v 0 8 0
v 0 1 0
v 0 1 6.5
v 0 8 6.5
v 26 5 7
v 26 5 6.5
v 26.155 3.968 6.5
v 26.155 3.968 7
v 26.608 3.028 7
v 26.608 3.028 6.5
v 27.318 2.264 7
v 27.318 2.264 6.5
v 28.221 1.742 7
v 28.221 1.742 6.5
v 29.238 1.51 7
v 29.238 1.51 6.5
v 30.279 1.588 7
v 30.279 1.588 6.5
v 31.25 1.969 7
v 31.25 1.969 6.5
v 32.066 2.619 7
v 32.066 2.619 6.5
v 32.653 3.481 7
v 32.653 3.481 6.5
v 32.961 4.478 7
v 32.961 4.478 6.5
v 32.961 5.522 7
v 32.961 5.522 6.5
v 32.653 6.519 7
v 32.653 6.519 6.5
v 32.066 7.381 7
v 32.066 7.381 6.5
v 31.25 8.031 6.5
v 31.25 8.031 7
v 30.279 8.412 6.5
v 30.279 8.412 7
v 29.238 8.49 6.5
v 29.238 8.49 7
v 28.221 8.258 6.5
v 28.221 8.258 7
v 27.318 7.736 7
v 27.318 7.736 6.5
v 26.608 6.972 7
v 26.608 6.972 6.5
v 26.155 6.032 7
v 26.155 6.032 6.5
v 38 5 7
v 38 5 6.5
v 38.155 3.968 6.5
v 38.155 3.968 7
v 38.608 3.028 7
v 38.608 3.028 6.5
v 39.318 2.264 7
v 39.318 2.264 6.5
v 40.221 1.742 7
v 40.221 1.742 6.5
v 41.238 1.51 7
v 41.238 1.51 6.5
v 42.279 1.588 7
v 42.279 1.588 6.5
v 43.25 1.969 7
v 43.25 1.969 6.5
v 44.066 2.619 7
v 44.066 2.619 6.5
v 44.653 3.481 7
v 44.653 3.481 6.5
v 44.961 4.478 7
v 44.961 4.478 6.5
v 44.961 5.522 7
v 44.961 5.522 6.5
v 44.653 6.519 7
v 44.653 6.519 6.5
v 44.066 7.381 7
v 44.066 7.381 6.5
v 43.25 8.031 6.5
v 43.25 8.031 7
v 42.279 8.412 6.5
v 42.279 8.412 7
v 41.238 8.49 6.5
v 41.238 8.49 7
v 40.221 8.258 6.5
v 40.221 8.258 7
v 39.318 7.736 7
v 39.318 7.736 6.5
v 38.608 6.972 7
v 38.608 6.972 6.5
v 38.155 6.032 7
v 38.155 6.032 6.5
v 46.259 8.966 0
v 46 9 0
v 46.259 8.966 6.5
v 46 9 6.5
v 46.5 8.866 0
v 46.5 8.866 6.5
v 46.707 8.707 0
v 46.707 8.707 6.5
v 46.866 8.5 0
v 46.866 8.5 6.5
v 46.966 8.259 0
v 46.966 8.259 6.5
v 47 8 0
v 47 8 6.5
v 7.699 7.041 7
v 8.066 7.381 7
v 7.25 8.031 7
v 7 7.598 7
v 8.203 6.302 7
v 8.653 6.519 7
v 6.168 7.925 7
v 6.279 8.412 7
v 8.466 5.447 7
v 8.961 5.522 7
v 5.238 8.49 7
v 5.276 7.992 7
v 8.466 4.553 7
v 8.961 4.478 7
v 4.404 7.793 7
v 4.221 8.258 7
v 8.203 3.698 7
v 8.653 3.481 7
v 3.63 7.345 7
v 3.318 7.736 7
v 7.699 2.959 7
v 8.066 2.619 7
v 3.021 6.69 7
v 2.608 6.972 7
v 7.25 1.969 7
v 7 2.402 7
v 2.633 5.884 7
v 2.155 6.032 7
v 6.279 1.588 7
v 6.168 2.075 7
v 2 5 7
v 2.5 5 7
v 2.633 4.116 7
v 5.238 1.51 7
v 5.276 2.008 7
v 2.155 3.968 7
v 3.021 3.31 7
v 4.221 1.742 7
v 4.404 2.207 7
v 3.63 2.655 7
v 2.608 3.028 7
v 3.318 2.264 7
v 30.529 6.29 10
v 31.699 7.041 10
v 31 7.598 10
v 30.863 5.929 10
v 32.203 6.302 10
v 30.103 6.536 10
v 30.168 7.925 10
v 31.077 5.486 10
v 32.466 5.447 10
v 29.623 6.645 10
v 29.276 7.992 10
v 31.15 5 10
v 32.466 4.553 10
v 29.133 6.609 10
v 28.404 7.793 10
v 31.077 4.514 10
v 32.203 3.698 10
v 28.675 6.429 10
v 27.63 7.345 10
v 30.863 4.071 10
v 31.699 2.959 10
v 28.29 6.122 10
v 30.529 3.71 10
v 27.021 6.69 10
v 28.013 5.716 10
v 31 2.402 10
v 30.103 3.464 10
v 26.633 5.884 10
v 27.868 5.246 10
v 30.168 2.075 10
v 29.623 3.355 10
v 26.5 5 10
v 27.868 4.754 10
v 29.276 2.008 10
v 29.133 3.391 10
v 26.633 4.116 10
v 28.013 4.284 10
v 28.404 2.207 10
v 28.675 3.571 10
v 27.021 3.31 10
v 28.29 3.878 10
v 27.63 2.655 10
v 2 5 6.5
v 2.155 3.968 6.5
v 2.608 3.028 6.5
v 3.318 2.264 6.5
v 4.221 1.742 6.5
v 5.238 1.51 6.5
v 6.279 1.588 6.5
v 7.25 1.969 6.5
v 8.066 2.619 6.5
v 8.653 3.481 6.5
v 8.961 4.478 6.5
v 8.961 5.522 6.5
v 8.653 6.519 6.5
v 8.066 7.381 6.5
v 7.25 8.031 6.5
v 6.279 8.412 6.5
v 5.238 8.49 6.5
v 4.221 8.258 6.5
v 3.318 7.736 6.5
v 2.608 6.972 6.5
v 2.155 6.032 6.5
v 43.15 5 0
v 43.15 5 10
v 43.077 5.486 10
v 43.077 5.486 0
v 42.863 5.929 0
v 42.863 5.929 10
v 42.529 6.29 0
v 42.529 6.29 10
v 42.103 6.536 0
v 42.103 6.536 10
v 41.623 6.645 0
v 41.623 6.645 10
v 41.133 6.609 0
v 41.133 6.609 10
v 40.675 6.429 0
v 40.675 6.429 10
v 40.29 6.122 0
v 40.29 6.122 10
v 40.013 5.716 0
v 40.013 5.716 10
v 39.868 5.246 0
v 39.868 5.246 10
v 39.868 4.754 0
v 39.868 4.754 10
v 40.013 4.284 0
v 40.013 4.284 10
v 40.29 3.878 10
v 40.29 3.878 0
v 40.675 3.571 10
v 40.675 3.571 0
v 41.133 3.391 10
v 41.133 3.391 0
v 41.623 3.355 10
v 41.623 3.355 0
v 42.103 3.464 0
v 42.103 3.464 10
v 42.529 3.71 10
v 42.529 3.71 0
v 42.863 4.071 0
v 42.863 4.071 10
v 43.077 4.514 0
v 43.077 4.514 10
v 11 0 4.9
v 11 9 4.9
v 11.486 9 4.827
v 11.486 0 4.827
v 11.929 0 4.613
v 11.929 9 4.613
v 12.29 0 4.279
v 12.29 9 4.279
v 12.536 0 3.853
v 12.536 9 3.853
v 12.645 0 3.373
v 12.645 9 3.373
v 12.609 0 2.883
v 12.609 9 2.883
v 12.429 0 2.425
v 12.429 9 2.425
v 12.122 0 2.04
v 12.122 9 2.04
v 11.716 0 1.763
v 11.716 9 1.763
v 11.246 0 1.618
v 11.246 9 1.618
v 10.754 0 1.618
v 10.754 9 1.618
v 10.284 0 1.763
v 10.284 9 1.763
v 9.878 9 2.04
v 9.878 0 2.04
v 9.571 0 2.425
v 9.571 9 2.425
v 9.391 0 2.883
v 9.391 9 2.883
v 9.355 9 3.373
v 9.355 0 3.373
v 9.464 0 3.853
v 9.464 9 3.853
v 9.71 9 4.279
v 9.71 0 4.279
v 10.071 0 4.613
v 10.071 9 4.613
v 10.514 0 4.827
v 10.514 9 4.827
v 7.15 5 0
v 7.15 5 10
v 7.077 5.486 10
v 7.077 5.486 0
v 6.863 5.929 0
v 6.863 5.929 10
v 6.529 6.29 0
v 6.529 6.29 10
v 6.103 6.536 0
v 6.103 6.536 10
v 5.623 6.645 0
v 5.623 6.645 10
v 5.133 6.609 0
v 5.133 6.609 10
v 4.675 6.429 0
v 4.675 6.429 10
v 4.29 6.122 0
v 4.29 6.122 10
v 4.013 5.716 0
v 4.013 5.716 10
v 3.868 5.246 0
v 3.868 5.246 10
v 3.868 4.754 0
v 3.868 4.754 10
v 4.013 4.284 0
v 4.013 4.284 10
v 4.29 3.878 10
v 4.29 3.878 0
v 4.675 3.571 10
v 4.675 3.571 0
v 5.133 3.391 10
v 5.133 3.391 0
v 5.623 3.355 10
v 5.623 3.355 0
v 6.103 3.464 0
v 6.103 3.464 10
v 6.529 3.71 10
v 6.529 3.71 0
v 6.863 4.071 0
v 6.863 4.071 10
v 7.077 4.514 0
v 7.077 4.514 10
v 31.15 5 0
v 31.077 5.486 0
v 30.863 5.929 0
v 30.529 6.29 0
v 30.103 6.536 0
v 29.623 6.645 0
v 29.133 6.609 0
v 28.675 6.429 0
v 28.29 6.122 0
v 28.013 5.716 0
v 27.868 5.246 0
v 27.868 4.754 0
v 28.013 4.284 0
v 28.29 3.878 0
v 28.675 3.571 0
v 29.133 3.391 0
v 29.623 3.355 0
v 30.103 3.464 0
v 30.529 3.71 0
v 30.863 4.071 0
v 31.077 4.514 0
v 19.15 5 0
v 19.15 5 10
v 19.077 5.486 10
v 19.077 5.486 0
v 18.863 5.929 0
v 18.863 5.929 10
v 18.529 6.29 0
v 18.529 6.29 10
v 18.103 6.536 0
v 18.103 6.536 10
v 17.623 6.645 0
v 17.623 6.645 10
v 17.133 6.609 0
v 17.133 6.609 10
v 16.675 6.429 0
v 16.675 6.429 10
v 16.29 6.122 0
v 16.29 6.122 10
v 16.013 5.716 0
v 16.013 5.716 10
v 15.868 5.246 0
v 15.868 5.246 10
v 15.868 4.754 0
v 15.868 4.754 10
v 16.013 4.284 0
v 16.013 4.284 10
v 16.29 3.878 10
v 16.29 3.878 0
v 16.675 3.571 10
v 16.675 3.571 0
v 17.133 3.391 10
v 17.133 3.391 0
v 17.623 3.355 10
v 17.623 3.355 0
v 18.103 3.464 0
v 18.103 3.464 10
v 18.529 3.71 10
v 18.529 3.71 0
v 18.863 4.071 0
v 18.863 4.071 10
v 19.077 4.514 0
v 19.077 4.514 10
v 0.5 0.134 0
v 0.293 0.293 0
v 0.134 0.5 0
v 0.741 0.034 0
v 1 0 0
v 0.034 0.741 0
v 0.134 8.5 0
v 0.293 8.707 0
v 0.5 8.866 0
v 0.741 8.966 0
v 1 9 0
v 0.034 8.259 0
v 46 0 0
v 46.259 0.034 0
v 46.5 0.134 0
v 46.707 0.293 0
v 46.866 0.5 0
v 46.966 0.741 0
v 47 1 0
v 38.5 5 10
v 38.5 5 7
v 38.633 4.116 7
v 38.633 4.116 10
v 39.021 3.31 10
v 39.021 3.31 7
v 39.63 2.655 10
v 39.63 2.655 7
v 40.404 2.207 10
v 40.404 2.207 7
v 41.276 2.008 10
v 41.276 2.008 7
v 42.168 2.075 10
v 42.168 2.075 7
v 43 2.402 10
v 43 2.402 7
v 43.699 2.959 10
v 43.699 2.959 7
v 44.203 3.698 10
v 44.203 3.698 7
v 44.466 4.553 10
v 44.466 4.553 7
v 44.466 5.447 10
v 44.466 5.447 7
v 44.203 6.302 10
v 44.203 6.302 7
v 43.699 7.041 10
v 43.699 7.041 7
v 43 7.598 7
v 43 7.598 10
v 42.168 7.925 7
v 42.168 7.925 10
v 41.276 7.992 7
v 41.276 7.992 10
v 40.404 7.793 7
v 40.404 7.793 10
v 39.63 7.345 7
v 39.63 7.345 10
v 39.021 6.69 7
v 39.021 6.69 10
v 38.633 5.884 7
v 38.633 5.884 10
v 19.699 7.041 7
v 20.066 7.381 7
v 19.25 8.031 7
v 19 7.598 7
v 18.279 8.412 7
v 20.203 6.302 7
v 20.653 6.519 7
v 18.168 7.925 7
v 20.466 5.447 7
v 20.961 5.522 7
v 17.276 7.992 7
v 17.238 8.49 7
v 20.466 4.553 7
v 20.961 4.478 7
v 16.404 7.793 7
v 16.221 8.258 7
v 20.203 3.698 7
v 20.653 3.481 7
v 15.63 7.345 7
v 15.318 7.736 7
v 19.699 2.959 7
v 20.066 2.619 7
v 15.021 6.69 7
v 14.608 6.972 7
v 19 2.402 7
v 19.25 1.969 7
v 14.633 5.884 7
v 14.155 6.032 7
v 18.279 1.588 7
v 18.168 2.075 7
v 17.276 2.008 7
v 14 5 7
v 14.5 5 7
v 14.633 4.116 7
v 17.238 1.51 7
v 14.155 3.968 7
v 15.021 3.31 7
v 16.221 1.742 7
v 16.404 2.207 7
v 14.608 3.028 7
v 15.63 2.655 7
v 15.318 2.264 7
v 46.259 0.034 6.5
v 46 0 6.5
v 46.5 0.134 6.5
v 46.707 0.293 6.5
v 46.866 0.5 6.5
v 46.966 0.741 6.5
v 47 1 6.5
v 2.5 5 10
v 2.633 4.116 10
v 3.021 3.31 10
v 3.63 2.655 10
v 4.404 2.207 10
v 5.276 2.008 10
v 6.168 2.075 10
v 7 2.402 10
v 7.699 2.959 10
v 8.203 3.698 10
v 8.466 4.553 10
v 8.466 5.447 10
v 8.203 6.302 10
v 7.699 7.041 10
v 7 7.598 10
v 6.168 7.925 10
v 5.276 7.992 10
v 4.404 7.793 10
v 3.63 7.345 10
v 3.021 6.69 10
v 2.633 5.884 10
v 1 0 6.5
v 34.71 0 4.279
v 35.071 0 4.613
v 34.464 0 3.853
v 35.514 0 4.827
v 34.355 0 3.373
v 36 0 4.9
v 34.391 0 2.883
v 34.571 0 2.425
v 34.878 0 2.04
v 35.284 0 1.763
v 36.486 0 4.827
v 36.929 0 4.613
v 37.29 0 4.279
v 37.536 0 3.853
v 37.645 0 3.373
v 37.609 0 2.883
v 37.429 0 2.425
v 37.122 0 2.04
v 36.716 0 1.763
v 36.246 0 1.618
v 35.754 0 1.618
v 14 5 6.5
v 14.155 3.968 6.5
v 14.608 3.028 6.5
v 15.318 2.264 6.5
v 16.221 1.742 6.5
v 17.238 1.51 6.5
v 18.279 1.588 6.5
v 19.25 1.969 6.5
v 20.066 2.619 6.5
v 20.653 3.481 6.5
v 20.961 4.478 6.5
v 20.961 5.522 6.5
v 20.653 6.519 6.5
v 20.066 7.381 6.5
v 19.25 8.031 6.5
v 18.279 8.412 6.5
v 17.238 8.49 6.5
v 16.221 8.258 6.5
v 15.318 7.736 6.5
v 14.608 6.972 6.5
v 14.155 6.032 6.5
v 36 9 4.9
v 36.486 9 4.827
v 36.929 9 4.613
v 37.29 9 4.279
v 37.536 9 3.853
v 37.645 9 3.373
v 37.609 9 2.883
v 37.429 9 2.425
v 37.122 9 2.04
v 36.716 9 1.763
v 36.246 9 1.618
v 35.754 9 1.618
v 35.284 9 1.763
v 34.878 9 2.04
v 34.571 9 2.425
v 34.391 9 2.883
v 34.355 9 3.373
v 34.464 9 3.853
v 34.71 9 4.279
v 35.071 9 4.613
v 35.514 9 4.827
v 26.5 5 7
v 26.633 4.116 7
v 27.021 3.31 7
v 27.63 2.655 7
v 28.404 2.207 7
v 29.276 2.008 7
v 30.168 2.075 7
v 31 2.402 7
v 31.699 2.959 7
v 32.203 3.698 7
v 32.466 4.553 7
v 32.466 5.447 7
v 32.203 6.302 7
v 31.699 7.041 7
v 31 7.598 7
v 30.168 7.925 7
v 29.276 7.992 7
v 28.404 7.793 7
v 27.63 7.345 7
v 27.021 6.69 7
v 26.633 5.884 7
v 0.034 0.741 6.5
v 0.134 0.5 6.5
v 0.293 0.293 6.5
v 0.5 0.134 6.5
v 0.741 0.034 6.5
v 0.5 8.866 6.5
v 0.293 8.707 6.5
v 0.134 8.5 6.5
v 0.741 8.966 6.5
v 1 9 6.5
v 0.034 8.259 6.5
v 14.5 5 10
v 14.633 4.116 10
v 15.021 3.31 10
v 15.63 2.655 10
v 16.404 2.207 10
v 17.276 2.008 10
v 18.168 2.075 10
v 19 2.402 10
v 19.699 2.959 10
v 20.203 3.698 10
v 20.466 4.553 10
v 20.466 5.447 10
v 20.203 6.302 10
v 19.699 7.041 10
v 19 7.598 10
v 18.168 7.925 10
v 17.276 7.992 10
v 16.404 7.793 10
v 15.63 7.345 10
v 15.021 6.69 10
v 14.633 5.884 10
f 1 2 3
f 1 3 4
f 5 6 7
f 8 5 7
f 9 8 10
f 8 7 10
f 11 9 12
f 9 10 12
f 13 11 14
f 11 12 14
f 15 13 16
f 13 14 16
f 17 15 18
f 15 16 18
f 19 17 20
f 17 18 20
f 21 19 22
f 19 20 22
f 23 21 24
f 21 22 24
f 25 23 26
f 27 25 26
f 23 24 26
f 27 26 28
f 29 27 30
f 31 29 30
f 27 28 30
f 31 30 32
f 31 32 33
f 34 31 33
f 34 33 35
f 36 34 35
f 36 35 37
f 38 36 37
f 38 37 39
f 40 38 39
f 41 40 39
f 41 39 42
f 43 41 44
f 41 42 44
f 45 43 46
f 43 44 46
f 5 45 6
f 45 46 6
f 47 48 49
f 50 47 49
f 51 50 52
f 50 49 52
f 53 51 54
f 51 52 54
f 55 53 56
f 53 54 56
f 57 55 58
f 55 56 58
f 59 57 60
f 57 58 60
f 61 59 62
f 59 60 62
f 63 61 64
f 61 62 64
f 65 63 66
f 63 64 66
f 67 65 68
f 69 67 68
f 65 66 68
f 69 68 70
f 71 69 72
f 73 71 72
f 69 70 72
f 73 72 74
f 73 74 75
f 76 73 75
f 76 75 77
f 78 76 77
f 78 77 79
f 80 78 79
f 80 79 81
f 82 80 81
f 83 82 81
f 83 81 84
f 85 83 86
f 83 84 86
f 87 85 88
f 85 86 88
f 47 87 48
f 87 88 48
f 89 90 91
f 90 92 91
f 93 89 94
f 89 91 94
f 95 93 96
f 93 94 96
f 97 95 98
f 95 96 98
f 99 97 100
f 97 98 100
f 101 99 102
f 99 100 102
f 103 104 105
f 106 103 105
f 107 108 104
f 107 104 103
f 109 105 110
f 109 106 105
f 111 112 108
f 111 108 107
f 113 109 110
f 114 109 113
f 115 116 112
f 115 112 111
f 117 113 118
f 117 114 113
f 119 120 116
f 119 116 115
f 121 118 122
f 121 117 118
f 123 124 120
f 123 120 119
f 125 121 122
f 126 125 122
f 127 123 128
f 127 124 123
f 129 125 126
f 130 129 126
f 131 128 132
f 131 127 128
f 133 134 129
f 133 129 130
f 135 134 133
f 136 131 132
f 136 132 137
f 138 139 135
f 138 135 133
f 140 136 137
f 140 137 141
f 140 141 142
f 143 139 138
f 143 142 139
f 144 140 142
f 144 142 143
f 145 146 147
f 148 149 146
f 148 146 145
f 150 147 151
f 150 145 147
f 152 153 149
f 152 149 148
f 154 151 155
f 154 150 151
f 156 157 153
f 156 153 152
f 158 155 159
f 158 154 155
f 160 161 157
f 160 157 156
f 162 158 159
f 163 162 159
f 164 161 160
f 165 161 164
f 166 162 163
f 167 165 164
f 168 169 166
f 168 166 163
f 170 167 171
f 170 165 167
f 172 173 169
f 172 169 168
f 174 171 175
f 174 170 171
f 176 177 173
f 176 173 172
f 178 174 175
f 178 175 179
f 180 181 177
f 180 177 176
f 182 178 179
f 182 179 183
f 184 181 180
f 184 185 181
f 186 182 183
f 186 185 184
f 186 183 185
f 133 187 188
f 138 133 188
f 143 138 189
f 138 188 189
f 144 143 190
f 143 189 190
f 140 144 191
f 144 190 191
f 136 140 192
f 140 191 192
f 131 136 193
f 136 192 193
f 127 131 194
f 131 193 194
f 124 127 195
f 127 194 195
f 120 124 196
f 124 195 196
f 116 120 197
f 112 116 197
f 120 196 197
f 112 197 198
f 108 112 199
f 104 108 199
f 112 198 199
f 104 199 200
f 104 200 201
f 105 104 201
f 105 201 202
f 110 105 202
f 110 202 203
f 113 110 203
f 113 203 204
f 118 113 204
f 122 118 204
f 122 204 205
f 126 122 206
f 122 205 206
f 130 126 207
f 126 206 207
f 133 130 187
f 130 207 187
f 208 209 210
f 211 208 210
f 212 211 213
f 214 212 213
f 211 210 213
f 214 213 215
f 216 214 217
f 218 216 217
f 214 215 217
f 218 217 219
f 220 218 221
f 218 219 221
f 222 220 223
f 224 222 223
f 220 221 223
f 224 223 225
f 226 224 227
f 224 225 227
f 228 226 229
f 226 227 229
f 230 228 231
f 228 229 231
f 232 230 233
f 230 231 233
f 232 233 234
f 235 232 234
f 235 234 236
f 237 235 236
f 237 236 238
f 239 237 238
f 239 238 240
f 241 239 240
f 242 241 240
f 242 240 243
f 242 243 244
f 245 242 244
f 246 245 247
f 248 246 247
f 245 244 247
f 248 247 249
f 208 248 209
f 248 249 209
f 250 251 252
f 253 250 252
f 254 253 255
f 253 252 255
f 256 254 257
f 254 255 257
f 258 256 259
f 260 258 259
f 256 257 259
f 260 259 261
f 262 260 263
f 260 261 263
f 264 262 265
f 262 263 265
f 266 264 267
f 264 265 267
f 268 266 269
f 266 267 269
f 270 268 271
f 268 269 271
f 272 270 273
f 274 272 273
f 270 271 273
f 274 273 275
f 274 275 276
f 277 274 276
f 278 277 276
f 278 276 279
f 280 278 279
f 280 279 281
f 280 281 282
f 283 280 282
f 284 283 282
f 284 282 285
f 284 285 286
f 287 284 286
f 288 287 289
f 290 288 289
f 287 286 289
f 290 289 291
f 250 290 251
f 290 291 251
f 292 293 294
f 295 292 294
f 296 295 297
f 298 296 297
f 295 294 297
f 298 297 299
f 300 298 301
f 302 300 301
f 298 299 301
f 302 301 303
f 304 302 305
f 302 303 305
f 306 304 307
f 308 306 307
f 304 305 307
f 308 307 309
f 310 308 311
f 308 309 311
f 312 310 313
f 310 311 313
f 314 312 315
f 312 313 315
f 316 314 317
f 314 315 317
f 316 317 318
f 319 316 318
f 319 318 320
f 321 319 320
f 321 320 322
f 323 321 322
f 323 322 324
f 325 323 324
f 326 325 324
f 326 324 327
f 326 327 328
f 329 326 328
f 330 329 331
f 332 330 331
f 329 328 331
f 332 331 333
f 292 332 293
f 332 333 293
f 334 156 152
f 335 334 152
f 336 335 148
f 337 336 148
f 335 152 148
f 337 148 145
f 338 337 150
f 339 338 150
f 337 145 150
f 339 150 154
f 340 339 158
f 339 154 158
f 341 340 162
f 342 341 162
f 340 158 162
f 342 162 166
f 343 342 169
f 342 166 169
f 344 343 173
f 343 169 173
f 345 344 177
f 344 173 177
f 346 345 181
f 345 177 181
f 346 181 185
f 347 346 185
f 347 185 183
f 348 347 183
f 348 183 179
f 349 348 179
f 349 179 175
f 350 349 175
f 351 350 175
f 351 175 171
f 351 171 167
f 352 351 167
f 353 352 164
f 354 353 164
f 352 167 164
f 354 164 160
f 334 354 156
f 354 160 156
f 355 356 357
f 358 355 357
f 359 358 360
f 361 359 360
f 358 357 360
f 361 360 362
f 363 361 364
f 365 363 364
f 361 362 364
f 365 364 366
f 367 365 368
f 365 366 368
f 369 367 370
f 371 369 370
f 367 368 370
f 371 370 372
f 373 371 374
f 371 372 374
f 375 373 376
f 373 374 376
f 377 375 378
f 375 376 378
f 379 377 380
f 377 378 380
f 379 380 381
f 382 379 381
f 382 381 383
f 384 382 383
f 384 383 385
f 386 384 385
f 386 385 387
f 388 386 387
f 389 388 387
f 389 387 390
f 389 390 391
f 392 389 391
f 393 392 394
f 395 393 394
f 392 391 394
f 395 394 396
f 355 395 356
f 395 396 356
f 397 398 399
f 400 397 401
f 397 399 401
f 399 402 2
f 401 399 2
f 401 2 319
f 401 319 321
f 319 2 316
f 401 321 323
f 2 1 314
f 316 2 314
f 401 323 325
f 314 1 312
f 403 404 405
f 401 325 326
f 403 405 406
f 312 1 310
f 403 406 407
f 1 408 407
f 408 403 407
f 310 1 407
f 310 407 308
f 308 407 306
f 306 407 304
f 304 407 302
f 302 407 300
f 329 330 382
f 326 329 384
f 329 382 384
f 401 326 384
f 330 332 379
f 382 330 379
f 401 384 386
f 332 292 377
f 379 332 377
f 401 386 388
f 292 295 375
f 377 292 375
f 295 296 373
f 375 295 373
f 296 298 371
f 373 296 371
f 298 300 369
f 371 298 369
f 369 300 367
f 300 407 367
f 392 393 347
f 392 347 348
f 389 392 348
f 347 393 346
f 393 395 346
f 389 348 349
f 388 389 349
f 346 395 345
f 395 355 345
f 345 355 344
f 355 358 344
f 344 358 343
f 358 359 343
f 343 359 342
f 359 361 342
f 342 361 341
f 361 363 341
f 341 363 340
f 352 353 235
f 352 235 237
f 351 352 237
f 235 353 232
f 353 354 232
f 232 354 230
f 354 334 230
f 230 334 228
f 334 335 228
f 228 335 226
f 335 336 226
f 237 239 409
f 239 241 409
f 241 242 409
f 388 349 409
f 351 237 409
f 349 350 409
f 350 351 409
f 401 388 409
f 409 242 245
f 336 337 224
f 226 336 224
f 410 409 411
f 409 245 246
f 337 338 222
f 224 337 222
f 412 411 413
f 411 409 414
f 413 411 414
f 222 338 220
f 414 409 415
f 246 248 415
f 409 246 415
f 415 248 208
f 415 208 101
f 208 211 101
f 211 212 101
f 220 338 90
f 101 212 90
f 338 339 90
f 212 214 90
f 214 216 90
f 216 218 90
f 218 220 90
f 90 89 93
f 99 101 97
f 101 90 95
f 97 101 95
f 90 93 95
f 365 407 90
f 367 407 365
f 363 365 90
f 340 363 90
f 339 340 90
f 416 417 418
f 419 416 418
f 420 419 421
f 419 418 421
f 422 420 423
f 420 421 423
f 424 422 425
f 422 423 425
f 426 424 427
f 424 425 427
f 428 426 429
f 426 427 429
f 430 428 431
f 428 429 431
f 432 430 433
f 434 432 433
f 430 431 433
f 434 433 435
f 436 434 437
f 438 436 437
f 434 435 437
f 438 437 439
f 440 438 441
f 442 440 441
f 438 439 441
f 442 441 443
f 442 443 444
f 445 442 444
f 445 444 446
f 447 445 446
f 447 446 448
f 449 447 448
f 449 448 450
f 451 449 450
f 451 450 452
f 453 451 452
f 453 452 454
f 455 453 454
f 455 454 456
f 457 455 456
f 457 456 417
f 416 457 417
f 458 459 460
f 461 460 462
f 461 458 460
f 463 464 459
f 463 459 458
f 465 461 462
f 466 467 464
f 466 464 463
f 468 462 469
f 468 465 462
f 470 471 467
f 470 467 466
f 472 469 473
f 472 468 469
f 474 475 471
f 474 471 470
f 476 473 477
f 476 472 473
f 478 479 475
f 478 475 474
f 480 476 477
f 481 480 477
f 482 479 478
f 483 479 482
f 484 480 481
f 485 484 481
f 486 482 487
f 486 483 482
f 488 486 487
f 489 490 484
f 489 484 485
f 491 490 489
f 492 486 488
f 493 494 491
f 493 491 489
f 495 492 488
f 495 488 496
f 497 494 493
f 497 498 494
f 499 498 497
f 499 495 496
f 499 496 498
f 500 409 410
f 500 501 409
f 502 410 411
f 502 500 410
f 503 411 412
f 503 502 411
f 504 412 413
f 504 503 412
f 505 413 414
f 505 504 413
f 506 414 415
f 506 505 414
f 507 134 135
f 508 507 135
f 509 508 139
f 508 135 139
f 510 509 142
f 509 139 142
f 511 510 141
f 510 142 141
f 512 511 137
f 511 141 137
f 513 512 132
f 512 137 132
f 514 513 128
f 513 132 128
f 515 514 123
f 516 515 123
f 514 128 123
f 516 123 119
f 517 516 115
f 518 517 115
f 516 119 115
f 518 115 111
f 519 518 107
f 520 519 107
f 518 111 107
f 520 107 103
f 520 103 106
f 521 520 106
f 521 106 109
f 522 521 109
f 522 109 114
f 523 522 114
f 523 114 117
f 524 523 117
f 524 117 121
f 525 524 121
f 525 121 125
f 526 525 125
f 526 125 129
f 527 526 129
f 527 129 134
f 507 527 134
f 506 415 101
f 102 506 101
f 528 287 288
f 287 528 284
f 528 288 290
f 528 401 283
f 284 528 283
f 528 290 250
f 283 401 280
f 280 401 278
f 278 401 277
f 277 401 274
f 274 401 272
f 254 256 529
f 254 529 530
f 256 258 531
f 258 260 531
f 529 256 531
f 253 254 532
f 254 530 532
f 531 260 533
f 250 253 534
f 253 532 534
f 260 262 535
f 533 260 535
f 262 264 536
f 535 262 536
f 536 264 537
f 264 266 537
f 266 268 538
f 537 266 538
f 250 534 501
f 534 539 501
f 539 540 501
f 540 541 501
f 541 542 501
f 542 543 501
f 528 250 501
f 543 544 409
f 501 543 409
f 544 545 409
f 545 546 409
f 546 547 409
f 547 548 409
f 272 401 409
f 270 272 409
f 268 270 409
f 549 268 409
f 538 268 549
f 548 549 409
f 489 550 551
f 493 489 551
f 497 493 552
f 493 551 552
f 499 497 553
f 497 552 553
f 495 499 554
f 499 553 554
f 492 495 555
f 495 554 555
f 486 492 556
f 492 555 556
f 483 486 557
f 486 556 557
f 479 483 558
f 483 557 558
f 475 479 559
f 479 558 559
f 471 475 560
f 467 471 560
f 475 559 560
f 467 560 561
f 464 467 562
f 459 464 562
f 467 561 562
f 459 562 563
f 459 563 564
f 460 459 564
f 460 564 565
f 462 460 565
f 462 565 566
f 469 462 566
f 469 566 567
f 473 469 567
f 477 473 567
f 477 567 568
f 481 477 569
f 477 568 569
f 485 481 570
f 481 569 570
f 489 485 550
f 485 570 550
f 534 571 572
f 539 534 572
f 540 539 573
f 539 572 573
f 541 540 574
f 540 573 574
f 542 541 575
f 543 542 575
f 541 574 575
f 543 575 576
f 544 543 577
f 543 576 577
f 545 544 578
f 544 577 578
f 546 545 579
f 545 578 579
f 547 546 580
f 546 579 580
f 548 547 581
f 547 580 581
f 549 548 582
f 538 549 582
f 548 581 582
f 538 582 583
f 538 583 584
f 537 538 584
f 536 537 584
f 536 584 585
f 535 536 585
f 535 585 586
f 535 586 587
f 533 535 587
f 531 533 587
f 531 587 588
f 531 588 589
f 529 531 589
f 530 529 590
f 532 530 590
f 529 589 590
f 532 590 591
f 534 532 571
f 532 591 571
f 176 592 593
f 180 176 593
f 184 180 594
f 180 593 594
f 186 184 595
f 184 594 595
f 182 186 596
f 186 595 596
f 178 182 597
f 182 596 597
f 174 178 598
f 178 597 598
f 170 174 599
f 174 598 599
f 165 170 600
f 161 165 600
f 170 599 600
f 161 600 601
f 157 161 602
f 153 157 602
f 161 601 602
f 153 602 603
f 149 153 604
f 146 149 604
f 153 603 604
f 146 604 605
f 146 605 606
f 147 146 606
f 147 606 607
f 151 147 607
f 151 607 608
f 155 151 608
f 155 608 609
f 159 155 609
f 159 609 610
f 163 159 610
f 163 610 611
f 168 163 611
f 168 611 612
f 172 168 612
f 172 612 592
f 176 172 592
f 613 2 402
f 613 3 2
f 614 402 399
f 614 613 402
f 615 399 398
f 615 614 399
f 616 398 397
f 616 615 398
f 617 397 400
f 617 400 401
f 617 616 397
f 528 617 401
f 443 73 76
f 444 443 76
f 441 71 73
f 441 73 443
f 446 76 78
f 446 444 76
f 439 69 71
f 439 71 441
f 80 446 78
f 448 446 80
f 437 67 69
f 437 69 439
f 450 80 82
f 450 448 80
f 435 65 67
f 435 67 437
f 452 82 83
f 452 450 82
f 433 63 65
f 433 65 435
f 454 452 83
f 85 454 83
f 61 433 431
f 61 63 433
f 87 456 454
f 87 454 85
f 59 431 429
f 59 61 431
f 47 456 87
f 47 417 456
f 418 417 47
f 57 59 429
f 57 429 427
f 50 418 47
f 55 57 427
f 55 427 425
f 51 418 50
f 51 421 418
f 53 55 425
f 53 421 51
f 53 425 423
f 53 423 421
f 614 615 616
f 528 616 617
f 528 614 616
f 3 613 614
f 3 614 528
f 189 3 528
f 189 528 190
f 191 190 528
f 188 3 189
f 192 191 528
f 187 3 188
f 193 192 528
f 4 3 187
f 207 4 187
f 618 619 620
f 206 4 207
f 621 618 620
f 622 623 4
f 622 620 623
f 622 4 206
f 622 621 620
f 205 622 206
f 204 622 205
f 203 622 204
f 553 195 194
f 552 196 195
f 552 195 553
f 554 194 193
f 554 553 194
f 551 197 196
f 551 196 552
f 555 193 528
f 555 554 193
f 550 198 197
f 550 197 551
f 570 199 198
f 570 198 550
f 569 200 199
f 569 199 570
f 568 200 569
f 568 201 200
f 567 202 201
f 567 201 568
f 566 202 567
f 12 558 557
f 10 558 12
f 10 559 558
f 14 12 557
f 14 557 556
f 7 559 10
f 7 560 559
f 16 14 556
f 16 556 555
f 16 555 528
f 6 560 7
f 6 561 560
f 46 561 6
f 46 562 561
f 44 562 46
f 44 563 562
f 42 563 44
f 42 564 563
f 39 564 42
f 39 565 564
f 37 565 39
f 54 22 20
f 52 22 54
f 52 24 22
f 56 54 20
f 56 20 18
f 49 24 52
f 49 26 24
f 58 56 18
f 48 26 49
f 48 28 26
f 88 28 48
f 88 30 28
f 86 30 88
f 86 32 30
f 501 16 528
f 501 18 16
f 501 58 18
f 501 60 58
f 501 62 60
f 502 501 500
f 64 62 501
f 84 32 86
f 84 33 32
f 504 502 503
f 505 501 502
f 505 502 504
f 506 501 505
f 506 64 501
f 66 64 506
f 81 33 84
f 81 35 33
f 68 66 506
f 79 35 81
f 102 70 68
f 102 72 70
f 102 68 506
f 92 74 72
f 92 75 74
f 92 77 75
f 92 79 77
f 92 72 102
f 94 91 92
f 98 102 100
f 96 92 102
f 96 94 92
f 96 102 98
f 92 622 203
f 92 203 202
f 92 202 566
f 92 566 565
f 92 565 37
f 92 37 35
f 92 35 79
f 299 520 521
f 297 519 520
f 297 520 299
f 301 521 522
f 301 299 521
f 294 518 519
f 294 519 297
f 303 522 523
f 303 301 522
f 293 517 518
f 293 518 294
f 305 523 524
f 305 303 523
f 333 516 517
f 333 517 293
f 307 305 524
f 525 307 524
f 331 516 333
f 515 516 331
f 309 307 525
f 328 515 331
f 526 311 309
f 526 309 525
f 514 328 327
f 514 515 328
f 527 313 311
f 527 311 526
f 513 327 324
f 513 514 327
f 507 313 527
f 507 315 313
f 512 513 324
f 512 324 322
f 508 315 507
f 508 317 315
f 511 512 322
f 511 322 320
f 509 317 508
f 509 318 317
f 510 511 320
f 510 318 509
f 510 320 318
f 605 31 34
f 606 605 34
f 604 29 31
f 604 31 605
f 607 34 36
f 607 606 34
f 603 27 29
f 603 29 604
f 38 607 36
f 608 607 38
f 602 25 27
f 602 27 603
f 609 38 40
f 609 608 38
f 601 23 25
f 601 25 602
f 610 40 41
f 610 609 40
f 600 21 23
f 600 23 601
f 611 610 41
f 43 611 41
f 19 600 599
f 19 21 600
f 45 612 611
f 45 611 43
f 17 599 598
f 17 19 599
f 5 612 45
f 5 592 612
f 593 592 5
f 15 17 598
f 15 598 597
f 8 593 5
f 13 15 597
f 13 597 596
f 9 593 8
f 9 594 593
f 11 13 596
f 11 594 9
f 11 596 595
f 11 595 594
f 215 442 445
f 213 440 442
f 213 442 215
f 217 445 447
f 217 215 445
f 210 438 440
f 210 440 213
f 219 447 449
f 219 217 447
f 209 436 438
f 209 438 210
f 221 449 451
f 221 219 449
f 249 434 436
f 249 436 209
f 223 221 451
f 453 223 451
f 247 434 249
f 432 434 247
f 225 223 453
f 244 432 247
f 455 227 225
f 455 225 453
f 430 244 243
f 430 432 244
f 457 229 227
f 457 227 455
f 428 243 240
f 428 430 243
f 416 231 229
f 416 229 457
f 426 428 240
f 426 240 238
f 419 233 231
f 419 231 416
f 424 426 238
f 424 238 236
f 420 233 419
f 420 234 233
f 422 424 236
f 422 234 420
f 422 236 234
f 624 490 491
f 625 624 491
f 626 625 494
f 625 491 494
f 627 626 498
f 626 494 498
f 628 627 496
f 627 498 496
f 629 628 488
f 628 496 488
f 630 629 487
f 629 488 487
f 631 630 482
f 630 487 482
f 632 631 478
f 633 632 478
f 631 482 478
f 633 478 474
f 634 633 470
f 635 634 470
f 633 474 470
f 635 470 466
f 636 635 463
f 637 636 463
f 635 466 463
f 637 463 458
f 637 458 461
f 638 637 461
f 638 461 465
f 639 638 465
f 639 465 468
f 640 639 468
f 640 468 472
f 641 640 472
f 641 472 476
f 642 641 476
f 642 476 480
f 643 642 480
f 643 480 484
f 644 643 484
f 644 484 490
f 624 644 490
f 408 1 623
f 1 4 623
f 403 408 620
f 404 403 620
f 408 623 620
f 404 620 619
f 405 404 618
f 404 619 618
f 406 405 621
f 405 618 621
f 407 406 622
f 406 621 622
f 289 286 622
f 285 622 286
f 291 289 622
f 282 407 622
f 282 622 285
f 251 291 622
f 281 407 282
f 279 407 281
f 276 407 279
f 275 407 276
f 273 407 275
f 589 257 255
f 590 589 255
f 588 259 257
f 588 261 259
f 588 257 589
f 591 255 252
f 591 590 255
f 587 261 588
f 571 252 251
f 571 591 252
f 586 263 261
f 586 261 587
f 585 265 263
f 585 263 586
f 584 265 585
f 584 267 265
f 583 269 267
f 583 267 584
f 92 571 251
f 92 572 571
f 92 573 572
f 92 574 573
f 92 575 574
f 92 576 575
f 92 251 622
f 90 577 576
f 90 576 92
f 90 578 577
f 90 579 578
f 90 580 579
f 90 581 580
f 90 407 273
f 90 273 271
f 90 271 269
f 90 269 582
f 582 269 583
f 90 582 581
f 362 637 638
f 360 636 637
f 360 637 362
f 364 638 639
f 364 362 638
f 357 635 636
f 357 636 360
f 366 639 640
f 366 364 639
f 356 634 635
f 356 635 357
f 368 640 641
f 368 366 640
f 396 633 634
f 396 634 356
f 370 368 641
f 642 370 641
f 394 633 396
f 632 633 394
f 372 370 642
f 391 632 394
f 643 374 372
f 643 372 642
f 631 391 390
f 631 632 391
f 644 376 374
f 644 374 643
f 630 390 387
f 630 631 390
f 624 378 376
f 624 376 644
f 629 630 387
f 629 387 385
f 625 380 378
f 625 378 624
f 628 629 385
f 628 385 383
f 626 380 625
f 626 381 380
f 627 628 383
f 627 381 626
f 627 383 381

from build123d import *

# Parameters (mm, degrees)
SKETCH_1_W          = 47
SKETCH_1_H          = 9
EXTRUDE_1_DEPTH     = 6.5
SKETCH_2_R          = 3
EXTRUDE_2_DEPTH     = 3.5
SKETCH_3_R          = 3.5
EXTRUDE_3_DEPTH     = 0.5
SKETCH_4_R          = 1.65
CUT_EXTRUDE_1_DEPTH = 10
SKETCH_5_R          = 1.65
CUT_EXTRUDE_2_DEPTH = 9
FILLET_1_R          = 1


with BuildPart() as part:
    # ｽｹｯﾁ1 → ﾎﾞｽ - 押し出し1 (new body)
    with BuildSketch(Plane.XY):
        with Locations((23.5, 4.5)):
            Rectangle(SKETCH_1_W, SKETCH_1_H)
    extrude(amount=EXTRUDE_1_DEPTH)

    # ｽｹｯﾁ2 → ﾎﾞｽ - 押し出し2 (add)
    with BuildSketch(Plane.XY.offset(6.5)):
        with Locations(Location((5.5, 5, 0), (0, 0, 180))):
            Circle(SKETCH_2_R)
        with Locations(Location((17.5, 5, 0), (0, 0, 180))):
            Circle(SKETCH_2_R)
        with Locations(Location((29.5, 5, 0), (0, 0, 180))):
            Circle(SKETCH_2_R)
        with Locations(Location((41.5, 5, 0), (0, 0, 180))):
            Circle(SKETCH_2_R)
    extrude(amount=EXTRUDE_2_DEPTH)

    # ｽｹｯﾁ3 → ﾎﾞｽ - 押し出し3 (add)
    with BuildSketch(Plane.XY.offset(6.5)):
        with Locations(Location((5.5, 5, 0), (0, 0, 180))):
            Circle(SKETCH_3_R)
        with Locations(Location((17.5, 5, 0), (0, 0, 180))):
            Circle(SKETCH_3_R)
        with Locations(Location((29.5, 5, 0), (0, 0, 180))):
            Circle(SKETCH_3_R)
        with Locations(Location((41.5, 5, 0), (0, 0, 180))):
            Circle(SKETCH_3_R)
    extrude(amount=EXTRUDE_3_DEPTH)

    # ｽｹｯﾁ4 → ｶｯﾄ - 押し出し1 (cut)
    with BuildSketch(Plane.XY.offset(10)):
        with Locations((5.5, 5)):
            Circle(SKETCH_4_R)
        with Locations((17.5, 5)):
            Circle(SKETCH_4_R)
        with Locations((29.5, 5)):
            Circle(SKETCH_4_R)
        with Locations((41.5, 5)):
            Circle(SKETCH_4_R)
    extrude(amount=-CUT_EXTRUDE_1_DEPTH, mode=Mode.SUBTRACT)

    # ｽｹｯﾁ5 → ｶｯﾄ - 押し出し2 (cut)
    with BuildSketch(Plane(origin=(0, 9, 0), x_dir=(1, 0, 0), z_dir=(0, 1, 0))):
        with Locations(Location((11, -3.25, 0), (0, 0, 270))):
            Circle(SKETCH_5_R)
        with Locations(Location((36, -3.25, 0), (0, 0, 270))):
            Circle(SKETCH_5_R)
    extrude(amount=-CUT_EXTRUDE_2_DEPTH, mode=Mode.SUBTRACT)

    # ﾌｨﾚｯﾄ1
    fillet_1_edges = [part.edges().sort_by_distance(p)[0] for p in [
        (0, 9, 3.25),
        (47, 9, 3.25),
        (47, 0, 3.25),
        (0, 0, 3.25),
    ]]
    fillet(fillet_1_edges, radius=FILLET_1_R)


solid = part.part
